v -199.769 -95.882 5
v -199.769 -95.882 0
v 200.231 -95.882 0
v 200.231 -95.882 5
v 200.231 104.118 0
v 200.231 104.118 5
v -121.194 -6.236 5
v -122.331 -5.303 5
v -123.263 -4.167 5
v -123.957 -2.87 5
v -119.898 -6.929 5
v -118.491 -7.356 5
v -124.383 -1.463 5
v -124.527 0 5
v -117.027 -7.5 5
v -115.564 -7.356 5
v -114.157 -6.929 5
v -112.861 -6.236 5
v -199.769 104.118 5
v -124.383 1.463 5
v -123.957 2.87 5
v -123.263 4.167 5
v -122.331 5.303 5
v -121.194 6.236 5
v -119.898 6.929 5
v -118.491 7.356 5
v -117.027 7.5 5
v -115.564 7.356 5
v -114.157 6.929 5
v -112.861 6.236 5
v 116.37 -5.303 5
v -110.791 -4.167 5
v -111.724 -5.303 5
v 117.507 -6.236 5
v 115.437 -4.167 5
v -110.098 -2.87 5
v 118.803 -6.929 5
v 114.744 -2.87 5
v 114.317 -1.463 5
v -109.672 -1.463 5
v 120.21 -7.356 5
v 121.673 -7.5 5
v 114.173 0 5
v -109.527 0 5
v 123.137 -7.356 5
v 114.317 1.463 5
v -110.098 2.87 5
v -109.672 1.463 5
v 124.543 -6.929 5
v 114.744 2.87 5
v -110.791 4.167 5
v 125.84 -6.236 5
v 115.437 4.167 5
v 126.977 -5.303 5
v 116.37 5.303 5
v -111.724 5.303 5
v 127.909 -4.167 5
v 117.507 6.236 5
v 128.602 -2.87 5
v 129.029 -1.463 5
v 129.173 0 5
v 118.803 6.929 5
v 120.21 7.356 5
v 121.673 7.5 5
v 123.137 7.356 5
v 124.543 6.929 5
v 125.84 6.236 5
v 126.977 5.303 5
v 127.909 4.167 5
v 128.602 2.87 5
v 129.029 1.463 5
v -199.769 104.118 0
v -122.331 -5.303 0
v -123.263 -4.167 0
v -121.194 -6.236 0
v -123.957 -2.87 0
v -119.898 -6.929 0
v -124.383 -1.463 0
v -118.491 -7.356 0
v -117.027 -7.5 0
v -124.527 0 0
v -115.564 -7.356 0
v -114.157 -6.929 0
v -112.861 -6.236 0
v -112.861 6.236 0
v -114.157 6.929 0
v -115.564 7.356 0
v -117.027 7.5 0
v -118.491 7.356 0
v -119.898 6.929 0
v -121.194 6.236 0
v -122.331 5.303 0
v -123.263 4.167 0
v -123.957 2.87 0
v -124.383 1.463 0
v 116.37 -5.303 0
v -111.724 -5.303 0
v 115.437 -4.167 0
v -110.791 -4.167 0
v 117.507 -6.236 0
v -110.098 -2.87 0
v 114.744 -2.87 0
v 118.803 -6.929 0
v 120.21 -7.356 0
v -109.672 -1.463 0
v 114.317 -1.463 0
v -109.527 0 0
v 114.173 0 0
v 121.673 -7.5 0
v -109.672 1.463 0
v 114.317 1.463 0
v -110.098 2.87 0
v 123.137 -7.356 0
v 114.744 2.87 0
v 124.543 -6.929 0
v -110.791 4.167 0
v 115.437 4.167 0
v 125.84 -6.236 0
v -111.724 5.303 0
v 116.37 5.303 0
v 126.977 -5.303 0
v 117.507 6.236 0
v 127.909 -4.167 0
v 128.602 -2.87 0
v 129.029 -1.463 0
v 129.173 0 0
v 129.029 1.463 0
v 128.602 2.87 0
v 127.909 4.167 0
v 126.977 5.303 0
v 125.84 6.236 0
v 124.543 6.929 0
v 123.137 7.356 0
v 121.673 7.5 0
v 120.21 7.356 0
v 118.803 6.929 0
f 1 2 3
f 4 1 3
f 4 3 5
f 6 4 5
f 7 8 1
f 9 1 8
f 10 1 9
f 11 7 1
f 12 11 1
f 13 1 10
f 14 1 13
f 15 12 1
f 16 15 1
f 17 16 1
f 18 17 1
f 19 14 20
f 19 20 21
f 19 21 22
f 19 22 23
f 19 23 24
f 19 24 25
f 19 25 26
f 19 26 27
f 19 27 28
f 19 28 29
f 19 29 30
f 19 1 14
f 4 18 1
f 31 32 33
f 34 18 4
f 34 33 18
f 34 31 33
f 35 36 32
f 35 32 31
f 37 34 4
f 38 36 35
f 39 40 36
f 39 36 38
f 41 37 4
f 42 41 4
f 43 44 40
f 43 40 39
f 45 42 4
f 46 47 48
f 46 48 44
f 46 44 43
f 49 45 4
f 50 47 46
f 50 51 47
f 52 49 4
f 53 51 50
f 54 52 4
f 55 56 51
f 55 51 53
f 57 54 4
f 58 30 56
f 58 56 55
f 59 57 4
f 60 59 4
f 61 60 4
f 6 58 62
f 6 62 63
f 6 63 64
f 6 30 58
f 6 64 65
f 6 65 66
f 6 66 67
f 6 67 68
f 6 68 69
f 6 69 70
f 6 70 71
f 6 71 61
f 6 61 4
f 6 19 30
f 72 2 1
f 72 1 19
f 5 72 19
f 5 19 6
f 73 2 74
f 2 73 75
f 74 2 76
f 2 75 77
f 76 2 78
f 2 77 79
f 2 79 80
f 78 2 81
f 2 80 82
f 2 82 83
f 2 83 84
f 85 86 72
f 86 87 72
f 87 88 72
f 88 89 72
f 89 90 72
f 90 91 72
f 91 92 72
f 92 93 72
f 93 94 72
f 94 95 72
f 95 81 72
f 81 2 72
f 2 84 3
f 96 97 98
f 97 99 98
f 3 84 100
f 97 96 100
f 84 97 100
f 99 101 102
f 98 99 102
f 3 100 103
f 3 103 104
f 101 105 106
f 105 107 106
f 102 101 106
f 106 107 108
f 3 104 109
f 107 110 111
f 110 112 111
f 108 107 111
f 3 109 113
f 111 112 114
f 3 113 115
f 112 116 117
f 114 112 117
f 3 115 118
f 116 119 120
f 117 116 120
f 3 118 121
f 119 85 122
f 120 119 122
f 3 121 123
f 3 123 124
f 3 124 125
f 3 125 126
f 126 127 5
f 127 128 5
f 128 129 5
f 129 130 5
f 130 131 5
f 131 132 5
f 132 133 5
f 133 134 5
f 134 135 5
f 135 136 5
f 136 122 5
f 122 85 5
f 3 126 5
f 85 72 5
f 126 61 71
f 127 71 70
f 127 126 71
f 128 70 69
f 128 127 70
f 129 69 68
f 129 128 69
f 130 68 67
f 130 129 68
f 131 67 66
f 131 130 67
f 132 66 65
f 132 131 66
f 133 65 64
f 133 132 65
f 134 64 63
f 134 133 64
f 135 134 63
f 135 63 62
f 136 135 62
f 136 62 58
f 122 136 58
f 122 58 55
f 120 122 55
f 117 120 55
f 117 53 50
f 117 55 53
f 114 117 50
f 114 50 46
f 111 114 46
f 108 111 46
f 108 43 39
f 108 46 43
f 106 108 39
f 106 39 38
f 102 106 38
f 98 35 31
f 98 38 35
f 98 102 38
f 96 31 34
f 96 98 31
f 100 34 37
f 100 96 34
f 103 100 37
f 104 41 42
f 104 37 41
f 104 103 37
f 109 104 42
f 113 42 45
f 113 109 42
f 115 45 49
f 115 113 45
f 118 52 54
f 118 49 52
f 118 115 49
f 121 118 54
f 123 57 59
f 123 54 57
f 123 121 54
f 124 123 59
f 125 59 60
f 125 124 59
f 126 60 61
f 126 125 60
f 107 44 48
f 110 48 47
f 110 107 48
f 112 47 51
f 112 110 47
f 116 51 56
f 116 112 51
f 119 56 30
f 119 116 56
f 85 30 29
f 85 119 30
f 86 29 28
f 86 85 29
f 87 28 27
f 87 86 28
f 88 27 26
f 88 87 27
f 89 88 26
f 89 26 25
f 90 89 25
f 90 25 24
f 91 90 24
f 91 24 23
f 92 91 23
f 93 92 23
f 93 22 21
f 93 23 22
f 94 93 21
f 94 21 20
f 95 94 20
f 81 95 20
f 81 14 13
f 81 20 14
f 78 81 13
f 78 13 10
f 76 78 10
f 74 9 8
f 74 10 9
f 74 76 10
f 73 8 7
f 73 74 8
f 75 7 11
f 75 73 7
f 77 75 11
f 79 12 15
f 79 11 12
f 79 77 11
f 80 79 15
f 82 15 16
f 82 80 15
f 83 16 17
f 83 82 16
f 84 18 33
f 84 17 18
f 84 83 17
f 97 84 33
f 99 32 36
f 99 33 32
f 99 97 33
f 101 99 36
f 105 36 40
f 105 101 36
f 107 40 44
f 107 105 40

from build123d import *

# Parameters (mm, degrees)
F0_W     = 400
F0_H     = 200
F1_DEPTH = 5
F2_R     = 7.5
F3_DEPTH = 25
F5_R     = 7.5
F6_DEPTH = 25


with BuildPart() as f1:
    # F0 (on Top) → F1 (new body)
    with BuildSketch(Plane.XY):
        with Locations((0.230974, 4.11826)):
            Rectangle(F0_W, F0_H)
    extrude(amount=F1_DEPTH)


with BuildPart() as f3:
    # F2 (on Top) → F3 (new body)
    with BuildSketch(Plane.XY):
        with Locations((121.673325, 0)):
            Circle(F2_R)
    extrude(amount=F3_DEPTH)


with BuildPart() as f1_1:
    add(f1.part)

    # F4: cut F3
    add(f3.part, mode=Mode.SUBTRACT)


with BuildPart() as f6:
    # F5 (on Top) → F6 (new body)
    with BuildSketch(Plane.XY):
        with Locations((-117.027458, 0)):
            Circle(F5_R)
    extrude(amount=F6_DEPTH)


with BuildPart() as f1_2:
    add(f1_1.part)

    # F7: cut F6
    add(f6.part, mode=Mode.SUBTRACT)


solid = f1_2.part
